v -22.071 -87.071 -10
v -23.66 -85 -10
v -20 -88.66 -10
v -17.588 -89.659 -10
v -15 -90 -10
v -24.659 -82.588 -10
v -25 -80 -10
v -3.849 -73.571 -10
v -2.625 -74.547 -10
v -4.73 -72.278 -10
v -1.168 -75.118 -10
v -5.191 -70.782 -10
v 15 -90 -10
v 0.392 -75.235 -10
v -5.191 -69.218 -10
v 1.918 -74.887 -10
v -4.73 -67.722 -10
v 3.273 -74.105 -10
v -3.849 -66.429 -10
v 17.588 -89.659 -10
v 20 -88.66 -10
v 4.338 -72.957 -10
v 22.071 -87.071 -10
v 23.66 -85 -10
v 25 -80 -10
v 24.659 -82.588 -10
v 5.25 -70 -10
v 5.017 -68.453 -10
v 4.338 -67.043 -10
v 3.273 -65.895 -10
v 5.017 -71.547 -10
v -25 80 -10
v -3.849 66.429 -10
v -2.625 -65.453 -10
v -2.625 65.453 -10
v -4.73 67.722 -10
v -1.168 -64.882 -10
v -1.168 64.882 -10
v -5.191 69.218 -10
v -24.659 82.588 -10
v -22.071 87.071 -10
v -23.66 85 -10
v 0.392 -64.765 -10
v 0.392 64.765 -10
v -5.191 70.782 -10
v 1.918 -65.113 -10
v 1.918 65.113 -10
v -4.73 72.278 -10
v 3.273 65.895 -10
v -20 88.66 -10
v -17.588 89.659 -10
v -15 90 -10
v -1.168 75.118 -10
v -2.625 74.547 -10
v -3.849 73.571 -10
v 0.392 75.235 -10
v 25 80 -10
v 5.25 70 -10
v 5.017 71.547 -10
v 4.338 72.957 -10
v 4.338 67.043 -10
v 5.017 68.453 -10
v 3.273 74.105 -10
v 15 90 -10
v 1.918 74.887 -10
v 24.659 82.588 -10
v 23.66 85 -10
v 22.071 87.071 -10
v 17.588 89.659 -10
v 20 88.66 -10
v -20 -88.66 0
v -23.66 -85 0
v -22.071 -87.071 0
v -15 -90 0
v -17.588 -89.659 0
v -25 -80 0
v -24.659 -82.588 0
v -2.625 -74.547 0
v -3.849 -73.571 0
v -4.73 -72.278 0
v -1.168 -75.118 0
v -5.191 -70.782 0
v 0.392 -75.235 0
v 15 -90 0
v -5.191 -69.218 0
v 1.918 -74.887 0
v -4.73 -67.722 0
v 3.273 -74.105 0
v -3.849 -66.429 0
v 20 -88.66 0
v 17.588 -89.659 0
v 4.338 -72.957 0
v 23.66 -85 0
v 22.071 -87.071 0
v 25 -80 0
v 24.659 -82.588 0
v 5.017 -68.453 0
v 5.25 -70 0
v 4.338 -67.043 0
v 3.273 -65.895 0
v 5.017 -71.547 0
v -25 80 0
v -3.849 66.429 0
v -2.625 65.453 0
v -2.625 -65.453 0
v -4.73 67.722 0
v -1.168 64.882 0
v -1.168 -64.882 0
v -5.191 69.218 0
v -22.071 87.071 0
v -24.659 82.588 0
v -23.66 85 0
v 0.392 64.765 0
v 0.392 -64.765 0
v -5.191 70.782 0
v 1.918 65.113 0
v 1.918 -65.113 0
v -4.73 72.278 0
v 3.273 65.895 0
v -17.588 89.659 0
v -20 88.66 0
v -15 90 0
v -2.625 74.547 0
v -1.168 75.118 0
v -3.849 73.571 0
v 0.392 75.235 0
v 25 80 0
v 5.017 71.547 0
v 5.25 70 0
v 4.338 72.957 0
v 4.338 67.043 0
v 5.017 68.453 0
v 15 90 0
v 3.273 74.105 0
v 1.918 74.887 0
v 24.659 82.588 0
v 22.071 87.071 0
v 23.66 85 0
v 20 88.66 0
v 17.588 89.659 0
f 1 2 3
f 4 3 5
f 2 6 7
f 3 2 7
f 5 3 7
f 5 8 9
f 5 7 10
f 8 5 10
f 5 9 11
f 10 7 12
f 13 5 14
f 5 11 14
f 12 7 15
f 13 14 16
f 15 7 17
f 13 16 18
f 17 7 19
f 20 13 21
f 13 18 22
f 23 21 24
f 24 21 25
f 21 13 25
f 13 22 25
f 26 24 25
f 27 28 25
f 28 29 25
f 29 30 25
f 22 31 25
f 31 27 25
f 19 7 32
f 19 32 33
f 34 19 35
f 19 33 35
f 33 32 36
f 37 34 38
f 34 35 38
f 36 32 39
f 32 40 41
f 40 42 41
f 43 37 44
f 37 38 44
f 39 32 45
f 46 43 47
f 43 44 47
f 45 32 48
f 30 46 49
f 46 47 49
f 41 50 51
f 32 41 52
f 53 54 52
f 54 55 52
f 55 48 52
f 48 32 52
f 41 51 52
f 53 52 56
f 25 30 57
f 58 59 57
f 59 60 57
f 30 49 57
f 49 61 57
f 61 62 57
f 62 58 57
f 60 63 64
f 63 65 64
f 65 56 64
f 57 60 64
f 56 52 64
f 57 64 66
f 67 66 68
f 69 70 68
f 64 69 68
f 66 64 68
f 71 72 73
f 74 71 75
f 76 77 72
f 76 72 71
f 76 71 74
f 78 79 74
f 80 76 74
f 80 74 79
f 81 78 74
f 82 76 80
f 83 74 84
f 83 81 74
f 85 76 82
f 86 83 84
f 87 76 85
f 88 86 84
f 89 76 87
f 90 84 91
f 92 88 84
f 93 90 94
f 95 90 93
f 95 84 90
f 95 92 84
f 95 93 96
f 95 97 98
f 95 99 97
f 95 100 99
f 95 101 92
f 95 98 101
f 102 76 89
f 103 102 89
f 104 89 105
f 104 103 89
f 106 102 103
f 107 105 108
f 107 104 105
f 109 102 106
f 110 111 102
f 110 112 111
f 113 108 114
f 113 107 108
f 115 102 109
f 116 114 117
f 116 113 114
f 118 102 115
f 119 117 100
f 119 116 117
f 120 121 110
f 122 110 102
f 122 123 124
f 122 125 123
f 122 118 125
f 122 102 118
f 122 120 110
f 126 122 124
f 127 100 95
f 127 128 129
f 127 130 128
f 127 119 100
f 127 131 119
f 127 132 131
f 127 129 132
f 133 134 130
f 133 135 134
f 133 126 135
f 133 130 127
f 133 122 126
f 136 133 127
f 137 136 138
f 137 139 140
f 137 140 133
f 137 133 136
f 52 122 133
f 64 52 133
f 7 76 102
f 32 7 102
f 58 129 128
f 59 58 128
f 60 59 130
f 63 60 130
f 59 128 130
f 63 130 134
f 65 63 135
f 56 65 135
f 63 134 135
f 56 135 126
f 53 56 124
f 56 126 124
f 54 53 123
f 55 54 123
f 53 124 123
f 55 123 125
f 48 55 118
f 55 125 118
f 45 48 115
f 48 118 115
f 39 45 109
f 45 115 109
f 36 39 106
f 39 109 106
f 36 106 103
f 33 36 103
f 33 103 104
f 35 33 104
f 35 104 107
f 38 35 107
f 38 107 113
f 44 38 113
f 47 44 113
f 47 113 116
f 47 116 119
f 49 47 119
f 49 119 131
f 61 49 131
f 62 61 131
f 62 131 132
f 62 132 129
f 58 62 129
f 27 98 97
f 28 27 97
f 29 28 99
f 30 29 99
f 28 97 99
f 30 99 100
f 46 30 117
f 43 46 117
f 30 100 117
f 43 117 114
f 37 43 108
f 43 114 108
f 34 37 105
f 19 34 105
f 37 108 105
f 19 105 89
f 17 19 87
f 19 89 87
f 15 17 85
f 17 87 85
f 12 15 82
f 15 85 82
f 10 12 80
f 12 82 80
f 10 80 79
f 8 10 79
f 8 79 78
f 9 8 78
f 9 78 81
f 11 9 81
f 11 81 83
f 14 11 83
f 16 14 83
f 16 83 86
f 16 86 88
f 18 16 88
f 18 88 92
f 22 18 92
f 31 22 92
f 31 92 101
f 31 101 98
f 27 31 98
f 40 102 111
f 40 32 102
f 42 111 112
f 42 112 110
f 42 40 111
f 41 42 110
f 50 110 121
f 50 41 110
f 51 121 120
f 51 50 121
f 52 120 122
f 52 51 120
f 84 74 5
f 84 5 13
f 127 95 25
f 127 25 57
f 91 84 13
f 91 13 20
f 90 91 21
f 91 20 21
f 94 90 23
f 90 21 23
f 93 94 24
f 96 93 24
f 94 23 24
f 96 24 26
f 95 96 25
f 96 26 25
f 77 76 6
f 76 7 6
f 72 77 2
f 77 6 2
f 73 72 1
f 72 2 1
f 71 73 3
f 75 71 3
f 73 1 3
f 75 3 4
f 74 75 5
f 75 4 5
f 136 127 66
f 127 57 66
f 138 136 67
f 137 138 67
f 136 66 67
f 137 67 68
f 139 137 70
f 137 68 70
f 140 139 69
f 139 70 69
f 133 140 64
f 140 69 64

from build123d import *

# Parameters (mm, degrees)
IZIM1_W               = 50
IZIM1_H               = 180
TABAN_FLAN_1_DEPTH    = 10
RADYUS1_R             = 10
IZIM2_R               = 5.25
KES_EKSTR_ZYON1_DEPTH = 20


# Sheet-metal steps are written as plain solids
with BuildPart() as part:
    # Çizim1 → Taban-Flanş1 (new body)
    with BuildSketch(Plane.XY):
        Rectangle(IZIM1_W, IZIM1_H)
    extrude(amount=-TABAN_FLAN_1_DEPTH)

    # Radyus1
    radyus1_edges = [part.edges().sort_by_distance(p)[0] for p in [
        (25, -90, -5),
        (-25, -90, -5),
        (-25, 90, -5),
        (25, 90, -5),
    ]]
    fillet(radyus1_edges, radius=RADYUS1_R)

    # Çizim2 → Kes-Ekstrüzyon1 (cut)
    with BuildSketch(Plane.XY):
        with Locations((0, 70)):
            Circle(IZIM2_R)
        with Locations((0, -70)):
            Circle(IZIM2_R)
    extrude(amount=-KES_EKSTR_ZYON1_DEPTH, mode=Mode.SUBTRACT)


solid = part.part
